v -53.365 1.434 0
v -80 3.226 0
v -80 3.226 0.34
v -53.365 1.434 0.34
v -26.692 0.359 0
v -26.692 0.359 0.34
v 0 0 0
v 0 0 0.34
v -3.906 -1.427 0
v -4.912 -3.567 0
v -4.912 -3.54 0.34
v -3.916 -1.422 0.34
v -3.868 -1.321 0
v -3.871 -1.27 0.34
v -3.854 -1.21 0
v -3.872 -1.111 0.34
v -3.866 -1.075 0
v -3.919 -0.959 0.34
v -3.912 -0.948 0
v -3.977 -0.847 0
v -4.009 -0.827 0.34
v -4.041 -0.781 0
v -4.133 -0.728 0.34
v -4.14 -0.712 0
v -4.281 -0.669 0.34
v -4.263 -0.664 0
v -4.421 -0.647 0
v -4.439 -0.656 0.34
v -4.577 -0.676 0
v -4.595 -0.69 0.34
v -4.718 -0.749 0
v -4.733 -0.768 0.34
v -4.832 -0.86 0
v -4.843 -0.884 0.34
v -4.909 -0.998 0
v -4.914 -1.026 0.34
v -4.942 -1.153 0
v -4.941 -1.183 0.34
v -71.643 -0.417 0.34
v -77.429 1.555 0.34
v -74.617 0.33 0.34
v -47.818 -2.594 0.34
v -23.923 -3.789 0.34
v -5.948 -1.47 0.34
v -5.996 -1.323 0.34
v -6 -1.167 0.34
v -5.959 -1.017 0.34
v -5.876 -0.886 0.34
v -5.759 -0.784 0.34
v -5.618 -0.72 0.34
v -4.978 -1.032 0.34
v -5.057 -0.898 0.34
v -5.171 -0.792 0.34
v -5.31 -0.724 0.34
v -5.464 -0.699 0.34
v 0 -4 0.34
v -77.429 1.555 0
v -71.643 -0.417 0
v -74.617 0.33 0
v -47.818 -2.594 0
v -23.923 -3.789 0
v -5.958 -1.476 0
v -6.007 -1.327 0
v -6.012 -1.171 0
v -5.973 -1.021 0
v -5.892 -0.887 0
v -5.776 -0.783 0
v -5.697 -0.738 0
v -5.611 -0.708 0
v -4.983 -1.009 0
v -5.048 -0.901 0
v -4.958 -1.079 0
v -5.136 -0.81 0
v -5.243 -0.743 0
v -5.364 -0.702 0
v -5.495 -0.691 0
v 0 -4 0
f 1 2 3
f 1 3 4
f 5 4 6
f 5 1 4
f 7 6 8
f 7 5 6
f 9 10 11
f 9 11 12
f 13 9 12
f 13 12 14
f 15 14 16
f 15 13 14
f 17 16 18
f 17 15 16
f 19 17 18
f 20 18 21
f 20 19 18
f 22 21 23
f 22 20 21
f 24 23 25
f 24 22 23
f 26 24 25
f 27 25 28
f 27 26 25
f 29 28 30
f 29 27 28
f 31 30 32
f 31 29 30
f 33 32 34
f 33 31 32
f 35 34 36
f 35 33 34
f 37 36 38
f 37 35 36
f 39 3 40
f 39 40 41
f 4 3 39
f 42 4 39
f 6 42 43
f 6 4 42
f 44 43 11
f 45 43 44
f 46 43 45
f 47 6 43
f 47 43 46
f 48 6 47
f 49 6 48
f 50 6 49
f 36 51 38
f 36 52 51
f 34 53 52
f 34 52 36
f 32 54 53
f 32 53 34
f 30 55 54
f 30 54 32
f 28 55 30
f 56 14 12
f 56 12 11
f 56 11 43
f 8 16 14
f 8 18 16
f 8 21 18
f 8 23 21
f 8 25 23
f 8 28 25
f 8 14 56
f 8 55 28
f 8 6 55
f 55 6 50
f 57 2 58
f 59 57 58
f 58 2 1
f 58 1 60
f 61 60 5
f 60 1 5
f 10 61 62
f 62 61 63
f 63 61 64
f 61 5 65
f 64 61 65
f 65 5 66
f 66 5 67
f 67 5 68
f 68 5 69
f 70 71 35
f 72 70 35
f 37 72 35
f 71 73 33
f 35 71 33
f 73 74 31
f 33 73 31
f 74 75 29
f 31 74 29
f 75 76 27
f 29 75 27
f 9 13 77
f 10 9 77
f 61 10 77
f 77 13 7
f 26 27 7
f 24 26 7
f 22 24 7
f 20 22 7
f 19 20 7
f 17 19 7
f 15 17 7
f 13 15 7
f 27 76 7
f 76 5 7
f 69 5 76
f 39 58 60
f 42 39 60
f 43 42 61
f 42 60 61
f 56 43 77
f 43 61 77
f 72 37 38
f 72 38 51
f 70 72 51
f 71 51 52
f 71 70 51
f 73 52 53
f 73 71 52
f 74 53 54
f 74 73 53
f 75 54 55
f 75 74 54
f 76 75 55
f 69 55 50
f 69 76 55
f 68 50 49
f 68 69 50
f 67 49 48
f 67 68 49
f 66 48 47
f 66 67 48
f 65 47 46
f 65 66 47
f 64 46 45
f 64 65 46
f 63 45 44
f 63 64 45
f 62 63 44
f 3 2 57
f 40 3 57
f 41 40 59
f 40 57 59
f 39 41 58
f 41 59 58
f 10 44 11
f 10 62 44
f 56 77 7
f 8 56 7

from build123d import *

# Parameters (mm, degrees)
PAD_DEPTH    = 0.34
SKETCH001_W  = 0.156622
SKETCH001_H  = 0.149374
POCKET_DEPTH = 5
POCKET_TAPER = -2


with BuildPart() as part:
    # Sketch → Pad (new body)
    with BuildSketch(Plane.XY):
        with BuildLine():
            Line((0, -4), (0, 0))
            ThreePointArc((-80, 3.226265), (-40.032514, 0.806894), (0, 0))
            ThreePointArc((-80, 3.226265), (-76.048382, 0.88435), (-71.642975, -0.416513))
            ThreePointArc((-71.642975, -0.416513), (-35.876826, -3.314616), (0, -4))
        make_face()
    extrude(amount=PAD_DEPTH)

    # Sketch001 (on Face6 of Pad) → Pocket (cut)
    with BuildSketch(Plane.XY.offset(0.34)):
        with Locations((28.704066, -26.028716)):
            Rectangle(SKETCH001_W, SKETCH001_H)
        with BuildLine():
            ThreePointArc((-4.941031, -1.182712), (-5.617721, -0.719636), (-5.947757, -1.470253))
            Line((-4.911924, -3.539593), (-5.947757, -1.470253))
            Line((-4.911924, -3.539593), (-3.916345, -1.422037))
            ThreePointArc((-3.916345, -1.422037), (-4.280826, -0.669294), (-4.941031, -1.182712))
        make_face()
    extrude(amount=-POCKET_DEPTH, taper=POCKET_TAPER, mode=Mode.SUBTRACT)


solid = part.part
